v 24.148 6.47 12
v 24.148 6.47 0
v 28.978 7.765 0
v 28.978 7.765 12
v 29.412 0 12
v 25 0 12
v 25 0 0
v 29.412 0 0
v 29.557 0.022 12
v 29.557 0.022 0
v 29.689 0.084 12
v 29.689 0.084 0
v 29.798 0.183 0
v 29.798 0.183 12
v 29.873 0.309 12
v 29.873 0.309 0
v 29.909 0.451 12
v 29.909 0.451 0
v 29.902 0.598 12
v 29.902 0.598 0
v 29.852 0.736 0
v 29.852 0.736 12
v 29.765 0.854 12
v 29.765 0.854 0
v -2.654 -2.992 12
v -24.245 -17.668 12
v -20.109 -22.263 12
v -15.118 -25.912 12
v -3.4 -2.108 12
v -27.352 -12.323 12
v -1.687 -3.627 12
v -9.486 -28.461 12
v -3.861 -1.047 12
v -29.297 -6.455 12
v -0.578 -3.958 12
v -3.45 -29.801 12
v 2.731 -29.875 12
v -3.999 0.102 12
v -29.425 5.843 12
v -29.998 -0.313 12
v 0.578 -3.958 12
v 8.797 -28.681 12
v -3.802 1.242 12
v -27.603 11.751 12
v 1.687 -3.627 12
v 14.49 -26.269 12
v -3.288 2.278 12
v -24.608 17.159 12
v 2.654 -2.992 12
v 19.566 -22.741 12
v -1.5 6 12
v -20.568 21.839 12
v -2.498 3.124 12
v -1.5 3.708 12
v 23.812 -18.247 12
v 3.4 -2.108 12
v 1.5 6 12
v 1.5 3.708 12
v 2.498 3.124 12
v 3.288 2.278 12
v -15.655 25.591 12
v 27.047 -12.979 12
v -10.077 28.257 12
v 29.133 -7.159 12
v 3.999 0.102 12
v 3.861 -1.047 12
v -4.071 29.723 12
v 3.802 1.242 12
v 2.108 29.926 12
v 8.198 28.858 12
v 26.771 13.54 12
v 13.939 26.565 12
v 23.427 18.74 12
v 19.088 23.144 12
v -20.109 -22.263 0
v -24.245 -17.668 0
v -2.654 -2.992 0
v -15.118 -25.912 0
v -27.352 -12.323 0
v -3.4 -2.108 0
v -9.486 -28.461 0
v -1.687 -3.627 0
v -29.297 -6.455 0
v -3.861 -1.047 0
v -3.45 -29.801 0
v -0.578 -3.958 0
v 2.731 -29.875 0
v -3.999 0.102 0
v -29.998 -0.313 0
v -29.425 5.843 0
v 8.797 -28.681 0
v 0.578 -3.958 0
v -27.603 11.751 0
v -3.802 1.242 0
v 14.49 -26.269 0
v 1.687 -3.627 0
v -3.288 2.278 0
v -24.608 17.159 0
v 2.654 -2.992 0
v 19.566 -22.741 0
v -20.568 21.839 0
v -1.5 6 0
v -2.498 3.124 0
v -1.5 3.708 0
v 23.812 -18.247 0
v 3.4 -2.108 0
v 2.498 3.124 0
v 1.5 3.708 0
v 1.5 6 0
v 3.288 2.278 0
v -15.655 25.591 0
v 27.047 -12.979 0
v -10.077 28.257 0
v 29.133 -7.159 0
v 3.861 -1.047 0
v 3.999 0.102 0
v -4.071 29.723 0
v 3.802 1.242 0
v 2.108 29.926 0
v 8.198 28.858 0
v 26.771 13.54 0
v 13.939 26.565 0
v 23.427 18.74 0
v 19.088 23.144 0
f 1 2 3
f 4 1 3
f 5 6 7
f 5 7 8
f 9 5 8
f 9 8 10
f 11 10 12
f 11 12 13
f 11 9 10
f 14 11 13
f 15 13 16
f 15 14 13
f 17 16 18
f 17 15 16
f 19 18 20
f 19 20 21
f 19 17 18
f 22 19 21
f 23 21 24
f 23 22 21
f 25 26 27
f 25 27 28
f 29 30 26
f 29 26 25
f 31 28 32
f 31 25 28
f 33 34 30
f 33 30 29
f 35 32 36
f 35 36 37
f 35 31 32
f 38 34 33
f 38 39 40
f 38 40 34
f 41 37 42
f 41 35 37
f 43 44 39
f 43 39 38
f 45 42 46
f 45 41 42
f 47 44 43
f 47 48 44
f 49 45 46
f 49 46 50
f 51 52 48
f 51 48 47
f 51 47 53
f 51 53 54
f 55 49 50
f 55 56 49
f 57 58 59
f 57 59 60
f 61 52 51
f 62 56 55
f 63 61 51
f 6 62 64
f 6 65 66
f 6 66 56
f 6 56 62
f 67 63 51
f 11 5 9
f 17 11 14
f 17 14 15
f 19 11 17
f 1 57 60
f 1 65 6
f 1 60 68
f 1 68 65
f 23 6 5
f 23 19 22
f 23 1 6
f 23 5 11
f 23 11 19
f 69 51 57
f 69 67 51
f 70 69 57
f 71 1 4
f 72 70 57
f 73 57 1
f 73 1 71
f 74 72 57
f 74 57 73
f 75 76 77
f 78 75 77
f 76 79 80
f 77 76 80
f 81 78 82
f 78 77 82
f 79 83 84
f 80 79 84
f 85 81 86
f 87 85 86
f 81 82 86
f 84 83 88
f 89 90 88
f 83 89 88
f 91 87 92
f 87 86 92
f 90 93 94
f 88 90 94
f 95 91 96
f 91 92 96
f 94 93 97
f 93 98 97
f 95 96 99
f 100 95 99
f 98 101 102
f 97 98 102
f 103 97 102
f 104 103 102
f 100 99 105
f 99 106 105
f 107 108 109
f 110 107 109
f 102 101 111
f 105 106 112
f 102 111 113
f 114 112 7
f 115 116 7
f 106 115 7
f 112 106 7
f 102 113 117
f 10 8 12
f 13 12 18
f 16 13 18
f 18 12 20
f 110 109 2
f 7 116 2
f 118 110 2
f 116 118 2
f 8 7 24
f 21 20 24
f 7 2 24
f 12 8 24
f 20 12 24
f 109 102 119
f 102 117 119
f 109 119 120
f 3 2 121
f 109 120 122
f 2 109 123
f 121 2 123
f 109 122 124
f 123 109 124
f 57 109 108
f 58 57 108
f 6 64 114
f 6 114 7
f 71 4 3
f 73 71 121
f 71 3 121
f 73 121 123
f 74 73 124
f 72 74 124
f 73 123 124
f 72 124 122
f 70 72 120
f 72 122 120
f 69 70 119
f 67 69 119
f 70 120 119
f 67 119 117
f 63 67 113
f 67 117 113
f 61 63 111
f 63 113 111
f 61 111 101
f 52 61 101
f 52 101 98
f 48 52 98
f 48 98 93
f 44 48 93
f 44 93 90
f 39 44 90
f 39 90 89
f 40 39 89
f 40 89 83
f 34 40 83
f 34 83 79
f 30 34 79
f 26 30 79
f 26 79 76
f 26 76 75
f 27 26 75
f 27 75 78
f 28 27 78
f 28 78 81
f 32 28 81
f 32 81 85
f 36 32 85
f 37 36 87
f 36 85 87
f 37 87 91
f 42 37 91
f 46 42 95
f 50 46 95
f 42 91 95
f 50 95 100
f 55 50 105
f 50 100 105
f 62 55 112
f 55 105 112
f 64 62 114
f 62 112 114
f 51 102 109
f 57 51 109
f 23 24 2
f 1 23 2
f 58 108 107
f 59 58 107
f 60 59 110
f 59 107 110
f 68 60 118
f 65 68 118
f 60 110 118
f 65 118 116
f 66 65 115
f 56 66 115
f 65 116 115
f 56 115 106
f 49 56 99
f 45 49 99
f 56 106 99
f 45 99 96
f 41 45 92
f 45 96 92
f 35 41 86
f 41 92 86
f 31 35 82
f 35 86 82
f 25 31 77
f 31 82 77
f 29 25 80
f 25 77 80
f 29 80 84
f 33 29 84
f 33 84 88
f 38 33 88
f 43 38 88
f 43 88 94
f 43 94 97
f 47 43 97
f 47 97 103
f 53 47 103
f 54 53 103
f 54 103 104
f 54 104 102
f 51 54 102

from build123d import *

# Parameters (mm, degrees)
SKETCH1_R          = 30
EXTRUDE1_DEPTH     = 12
CUT_EXTRUDE1_DEPTH = 12


with BuildPart() as part:
    # Sketch1 → Extrude1 (new body)
    with BuildSketch(Plane.XY):
        Circle(SKETCH1_R)
        with BuildLine():
            Line((-1.5, 6), (1.5, 6))
            Line((1.5, 6), (1.5, 3.708099244))
            ThreePointArc((1.5, 3.708099244), (0, -4), (-1.5, 3.708099244))
            Line((-1.5, 3.708099244), (-1.5, 6))
        make_face(mode=Mode.SUBTRACT)
    extrude(amount=EXTRUDE1_DEPTH)

    # Sketch2 → Cut-Extrude1 (cut)
    with BuildSketch(Plane.XY.offset(12)):
        with BuildLine():
            Line((25, 0), (29.411515004, 0))
            ThreePointArc((29.411515004, 0), (29.87345477, 0.308658284), (29.765068394, 0.853553391))
            Line((29.765068394, 0.853553391), (24.148145657, 6.470476128))
            Line((24.148145657, 6.470476128), (34.591694707, 9.268816662))
            Line((34.591694707, 9.268816662), (29.575317547, -7.924682453))
            Line((29.575317547, -7.924682453), (25, 0))
        make_face()
    extrude(amount=-CUT_EXTRUDE1_DEPTH, mode=Mode.SUBTRACT)


solid = part.part
